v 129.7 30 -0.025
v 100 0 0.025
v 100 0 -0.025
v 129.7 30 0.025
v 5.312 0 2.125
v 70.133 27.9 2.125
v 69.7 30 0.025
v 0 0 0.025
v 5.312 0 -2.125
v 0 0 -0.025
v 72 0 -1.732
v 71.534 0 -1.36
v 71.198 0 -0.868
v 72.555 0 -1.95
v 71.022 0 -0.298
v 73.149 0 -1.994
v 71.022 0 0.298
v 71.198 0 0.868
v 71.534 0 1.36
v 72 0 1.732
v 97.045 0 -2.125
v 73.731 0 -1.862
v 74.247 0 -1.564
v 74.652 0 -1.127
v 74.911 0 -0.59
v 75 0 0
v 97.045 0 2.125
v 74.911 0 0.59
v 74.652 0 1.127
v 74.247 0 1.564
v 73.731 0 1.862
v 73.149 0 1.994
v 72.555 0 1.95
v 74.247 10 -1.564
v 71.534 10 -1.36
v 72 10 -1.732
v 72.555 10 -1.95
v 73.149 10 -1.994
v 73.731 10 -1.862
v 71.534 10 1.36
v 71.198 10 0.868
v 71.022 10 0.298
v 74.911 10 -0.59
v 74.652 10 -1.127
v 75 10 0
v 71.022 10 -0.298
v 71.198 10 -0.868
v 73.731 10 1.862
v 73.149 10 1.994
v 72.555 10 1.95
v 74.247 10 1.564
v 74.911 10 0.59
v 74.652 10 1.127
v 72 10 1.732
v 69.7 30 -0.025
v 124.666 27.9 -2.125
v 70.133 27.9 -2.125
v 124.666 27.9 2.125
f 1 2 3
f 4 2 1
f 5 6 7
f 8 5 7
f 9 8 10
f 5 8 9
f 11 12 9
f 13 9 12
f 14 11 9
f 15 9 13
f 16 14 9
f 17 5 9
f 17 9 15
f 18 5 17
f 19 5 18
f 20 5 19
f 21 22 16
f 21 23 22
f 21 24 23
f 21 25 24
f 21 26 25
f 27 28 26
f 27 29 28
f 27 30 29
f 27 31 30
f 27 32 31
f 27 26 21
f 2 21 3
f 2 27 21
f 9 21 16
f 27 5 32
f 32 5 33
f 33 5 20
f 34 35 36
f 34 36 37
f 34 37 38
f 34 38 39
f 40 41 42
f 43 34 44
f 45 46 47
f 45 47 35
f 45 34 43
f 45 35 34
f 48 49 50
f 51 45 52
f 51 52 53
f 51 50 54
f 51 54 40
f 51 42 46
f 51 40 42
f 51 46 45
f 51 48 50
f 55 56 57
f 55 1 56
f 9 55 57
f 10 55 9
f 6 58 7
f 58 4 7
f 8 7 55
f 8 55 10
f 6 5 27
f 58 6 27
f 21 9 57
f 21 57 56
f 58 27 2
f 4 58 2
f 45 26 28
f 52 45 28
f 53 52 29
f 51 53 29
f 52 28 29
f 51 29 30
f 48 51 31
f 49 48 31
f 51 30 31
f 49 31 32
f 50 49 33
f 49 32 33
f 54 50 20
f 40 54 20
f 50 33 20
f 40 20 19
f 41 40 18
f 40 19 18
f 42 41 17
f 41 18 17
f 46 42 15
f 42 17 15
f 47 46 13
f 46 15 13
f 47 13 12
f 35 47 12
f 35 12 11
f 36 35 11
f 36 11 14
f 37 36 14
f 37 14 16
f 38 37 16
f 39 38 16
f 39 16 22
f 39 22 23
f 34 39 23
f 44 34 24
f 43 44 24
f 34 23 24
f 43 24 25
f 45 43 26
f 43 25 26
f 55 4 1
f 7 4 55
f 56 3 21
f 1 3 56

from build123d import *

# Parameters (mm, degrees)
SALIENTE_EXTRUIR1_DEPTH    = 2.125
CROQUIS3_R                 = 2
CORTAR_EXTRUIR1_DEPTH      = 1
CORTAR_EXTRUIR1_DEPTH_BACK = 10
CHAMFER1_SIZE              = 2.1


with BuildPart() as part:
    # Croquis1 → Saliente-Extruir1 (new body, symmetric)
    with BuildSketch(Plane.XY):
        Polygon((0, 0), (100, 0), (129.7, 30), (69.7, 30), align=None)
    extrude(amount=SALIENTE_EXTRUIR1_DEPTH, both=True)

    # Croquis3 → Cortar-Extruir1 (cut, two sides)
    with BuildSketch(Plane.XZ) as cortar_extruir1_sk:
        with Locations((73, 0)):
            Circle(CROQUIS3_R)
    extrude(amount=CORTAR_EXTRUIR1_DEPTH, mode=Mode.SUBTRACT)
    extrude(cortar_extruir1_sk.sketch, amount=-CORTAR_EXTRUIR1_DEPTH_BACK, mode=Mode.SUBTRACT)

    # Chamfer1
    chamfer1_edges = [part.edges().sort_by_distance(p)[0] for p in [
        (114.85, 15, 2.125),
        (99.7, 30, 2.125),
        (34.85, 15, 2.125),
        (99.7, 30, -2.125),
        (114.85, 15, -2.125),
        (34.85, 15, -2.125),
    ]]
    chamfer(chamfer1_edges, length=CHAMFER1_SIZE)


solid = part.part
